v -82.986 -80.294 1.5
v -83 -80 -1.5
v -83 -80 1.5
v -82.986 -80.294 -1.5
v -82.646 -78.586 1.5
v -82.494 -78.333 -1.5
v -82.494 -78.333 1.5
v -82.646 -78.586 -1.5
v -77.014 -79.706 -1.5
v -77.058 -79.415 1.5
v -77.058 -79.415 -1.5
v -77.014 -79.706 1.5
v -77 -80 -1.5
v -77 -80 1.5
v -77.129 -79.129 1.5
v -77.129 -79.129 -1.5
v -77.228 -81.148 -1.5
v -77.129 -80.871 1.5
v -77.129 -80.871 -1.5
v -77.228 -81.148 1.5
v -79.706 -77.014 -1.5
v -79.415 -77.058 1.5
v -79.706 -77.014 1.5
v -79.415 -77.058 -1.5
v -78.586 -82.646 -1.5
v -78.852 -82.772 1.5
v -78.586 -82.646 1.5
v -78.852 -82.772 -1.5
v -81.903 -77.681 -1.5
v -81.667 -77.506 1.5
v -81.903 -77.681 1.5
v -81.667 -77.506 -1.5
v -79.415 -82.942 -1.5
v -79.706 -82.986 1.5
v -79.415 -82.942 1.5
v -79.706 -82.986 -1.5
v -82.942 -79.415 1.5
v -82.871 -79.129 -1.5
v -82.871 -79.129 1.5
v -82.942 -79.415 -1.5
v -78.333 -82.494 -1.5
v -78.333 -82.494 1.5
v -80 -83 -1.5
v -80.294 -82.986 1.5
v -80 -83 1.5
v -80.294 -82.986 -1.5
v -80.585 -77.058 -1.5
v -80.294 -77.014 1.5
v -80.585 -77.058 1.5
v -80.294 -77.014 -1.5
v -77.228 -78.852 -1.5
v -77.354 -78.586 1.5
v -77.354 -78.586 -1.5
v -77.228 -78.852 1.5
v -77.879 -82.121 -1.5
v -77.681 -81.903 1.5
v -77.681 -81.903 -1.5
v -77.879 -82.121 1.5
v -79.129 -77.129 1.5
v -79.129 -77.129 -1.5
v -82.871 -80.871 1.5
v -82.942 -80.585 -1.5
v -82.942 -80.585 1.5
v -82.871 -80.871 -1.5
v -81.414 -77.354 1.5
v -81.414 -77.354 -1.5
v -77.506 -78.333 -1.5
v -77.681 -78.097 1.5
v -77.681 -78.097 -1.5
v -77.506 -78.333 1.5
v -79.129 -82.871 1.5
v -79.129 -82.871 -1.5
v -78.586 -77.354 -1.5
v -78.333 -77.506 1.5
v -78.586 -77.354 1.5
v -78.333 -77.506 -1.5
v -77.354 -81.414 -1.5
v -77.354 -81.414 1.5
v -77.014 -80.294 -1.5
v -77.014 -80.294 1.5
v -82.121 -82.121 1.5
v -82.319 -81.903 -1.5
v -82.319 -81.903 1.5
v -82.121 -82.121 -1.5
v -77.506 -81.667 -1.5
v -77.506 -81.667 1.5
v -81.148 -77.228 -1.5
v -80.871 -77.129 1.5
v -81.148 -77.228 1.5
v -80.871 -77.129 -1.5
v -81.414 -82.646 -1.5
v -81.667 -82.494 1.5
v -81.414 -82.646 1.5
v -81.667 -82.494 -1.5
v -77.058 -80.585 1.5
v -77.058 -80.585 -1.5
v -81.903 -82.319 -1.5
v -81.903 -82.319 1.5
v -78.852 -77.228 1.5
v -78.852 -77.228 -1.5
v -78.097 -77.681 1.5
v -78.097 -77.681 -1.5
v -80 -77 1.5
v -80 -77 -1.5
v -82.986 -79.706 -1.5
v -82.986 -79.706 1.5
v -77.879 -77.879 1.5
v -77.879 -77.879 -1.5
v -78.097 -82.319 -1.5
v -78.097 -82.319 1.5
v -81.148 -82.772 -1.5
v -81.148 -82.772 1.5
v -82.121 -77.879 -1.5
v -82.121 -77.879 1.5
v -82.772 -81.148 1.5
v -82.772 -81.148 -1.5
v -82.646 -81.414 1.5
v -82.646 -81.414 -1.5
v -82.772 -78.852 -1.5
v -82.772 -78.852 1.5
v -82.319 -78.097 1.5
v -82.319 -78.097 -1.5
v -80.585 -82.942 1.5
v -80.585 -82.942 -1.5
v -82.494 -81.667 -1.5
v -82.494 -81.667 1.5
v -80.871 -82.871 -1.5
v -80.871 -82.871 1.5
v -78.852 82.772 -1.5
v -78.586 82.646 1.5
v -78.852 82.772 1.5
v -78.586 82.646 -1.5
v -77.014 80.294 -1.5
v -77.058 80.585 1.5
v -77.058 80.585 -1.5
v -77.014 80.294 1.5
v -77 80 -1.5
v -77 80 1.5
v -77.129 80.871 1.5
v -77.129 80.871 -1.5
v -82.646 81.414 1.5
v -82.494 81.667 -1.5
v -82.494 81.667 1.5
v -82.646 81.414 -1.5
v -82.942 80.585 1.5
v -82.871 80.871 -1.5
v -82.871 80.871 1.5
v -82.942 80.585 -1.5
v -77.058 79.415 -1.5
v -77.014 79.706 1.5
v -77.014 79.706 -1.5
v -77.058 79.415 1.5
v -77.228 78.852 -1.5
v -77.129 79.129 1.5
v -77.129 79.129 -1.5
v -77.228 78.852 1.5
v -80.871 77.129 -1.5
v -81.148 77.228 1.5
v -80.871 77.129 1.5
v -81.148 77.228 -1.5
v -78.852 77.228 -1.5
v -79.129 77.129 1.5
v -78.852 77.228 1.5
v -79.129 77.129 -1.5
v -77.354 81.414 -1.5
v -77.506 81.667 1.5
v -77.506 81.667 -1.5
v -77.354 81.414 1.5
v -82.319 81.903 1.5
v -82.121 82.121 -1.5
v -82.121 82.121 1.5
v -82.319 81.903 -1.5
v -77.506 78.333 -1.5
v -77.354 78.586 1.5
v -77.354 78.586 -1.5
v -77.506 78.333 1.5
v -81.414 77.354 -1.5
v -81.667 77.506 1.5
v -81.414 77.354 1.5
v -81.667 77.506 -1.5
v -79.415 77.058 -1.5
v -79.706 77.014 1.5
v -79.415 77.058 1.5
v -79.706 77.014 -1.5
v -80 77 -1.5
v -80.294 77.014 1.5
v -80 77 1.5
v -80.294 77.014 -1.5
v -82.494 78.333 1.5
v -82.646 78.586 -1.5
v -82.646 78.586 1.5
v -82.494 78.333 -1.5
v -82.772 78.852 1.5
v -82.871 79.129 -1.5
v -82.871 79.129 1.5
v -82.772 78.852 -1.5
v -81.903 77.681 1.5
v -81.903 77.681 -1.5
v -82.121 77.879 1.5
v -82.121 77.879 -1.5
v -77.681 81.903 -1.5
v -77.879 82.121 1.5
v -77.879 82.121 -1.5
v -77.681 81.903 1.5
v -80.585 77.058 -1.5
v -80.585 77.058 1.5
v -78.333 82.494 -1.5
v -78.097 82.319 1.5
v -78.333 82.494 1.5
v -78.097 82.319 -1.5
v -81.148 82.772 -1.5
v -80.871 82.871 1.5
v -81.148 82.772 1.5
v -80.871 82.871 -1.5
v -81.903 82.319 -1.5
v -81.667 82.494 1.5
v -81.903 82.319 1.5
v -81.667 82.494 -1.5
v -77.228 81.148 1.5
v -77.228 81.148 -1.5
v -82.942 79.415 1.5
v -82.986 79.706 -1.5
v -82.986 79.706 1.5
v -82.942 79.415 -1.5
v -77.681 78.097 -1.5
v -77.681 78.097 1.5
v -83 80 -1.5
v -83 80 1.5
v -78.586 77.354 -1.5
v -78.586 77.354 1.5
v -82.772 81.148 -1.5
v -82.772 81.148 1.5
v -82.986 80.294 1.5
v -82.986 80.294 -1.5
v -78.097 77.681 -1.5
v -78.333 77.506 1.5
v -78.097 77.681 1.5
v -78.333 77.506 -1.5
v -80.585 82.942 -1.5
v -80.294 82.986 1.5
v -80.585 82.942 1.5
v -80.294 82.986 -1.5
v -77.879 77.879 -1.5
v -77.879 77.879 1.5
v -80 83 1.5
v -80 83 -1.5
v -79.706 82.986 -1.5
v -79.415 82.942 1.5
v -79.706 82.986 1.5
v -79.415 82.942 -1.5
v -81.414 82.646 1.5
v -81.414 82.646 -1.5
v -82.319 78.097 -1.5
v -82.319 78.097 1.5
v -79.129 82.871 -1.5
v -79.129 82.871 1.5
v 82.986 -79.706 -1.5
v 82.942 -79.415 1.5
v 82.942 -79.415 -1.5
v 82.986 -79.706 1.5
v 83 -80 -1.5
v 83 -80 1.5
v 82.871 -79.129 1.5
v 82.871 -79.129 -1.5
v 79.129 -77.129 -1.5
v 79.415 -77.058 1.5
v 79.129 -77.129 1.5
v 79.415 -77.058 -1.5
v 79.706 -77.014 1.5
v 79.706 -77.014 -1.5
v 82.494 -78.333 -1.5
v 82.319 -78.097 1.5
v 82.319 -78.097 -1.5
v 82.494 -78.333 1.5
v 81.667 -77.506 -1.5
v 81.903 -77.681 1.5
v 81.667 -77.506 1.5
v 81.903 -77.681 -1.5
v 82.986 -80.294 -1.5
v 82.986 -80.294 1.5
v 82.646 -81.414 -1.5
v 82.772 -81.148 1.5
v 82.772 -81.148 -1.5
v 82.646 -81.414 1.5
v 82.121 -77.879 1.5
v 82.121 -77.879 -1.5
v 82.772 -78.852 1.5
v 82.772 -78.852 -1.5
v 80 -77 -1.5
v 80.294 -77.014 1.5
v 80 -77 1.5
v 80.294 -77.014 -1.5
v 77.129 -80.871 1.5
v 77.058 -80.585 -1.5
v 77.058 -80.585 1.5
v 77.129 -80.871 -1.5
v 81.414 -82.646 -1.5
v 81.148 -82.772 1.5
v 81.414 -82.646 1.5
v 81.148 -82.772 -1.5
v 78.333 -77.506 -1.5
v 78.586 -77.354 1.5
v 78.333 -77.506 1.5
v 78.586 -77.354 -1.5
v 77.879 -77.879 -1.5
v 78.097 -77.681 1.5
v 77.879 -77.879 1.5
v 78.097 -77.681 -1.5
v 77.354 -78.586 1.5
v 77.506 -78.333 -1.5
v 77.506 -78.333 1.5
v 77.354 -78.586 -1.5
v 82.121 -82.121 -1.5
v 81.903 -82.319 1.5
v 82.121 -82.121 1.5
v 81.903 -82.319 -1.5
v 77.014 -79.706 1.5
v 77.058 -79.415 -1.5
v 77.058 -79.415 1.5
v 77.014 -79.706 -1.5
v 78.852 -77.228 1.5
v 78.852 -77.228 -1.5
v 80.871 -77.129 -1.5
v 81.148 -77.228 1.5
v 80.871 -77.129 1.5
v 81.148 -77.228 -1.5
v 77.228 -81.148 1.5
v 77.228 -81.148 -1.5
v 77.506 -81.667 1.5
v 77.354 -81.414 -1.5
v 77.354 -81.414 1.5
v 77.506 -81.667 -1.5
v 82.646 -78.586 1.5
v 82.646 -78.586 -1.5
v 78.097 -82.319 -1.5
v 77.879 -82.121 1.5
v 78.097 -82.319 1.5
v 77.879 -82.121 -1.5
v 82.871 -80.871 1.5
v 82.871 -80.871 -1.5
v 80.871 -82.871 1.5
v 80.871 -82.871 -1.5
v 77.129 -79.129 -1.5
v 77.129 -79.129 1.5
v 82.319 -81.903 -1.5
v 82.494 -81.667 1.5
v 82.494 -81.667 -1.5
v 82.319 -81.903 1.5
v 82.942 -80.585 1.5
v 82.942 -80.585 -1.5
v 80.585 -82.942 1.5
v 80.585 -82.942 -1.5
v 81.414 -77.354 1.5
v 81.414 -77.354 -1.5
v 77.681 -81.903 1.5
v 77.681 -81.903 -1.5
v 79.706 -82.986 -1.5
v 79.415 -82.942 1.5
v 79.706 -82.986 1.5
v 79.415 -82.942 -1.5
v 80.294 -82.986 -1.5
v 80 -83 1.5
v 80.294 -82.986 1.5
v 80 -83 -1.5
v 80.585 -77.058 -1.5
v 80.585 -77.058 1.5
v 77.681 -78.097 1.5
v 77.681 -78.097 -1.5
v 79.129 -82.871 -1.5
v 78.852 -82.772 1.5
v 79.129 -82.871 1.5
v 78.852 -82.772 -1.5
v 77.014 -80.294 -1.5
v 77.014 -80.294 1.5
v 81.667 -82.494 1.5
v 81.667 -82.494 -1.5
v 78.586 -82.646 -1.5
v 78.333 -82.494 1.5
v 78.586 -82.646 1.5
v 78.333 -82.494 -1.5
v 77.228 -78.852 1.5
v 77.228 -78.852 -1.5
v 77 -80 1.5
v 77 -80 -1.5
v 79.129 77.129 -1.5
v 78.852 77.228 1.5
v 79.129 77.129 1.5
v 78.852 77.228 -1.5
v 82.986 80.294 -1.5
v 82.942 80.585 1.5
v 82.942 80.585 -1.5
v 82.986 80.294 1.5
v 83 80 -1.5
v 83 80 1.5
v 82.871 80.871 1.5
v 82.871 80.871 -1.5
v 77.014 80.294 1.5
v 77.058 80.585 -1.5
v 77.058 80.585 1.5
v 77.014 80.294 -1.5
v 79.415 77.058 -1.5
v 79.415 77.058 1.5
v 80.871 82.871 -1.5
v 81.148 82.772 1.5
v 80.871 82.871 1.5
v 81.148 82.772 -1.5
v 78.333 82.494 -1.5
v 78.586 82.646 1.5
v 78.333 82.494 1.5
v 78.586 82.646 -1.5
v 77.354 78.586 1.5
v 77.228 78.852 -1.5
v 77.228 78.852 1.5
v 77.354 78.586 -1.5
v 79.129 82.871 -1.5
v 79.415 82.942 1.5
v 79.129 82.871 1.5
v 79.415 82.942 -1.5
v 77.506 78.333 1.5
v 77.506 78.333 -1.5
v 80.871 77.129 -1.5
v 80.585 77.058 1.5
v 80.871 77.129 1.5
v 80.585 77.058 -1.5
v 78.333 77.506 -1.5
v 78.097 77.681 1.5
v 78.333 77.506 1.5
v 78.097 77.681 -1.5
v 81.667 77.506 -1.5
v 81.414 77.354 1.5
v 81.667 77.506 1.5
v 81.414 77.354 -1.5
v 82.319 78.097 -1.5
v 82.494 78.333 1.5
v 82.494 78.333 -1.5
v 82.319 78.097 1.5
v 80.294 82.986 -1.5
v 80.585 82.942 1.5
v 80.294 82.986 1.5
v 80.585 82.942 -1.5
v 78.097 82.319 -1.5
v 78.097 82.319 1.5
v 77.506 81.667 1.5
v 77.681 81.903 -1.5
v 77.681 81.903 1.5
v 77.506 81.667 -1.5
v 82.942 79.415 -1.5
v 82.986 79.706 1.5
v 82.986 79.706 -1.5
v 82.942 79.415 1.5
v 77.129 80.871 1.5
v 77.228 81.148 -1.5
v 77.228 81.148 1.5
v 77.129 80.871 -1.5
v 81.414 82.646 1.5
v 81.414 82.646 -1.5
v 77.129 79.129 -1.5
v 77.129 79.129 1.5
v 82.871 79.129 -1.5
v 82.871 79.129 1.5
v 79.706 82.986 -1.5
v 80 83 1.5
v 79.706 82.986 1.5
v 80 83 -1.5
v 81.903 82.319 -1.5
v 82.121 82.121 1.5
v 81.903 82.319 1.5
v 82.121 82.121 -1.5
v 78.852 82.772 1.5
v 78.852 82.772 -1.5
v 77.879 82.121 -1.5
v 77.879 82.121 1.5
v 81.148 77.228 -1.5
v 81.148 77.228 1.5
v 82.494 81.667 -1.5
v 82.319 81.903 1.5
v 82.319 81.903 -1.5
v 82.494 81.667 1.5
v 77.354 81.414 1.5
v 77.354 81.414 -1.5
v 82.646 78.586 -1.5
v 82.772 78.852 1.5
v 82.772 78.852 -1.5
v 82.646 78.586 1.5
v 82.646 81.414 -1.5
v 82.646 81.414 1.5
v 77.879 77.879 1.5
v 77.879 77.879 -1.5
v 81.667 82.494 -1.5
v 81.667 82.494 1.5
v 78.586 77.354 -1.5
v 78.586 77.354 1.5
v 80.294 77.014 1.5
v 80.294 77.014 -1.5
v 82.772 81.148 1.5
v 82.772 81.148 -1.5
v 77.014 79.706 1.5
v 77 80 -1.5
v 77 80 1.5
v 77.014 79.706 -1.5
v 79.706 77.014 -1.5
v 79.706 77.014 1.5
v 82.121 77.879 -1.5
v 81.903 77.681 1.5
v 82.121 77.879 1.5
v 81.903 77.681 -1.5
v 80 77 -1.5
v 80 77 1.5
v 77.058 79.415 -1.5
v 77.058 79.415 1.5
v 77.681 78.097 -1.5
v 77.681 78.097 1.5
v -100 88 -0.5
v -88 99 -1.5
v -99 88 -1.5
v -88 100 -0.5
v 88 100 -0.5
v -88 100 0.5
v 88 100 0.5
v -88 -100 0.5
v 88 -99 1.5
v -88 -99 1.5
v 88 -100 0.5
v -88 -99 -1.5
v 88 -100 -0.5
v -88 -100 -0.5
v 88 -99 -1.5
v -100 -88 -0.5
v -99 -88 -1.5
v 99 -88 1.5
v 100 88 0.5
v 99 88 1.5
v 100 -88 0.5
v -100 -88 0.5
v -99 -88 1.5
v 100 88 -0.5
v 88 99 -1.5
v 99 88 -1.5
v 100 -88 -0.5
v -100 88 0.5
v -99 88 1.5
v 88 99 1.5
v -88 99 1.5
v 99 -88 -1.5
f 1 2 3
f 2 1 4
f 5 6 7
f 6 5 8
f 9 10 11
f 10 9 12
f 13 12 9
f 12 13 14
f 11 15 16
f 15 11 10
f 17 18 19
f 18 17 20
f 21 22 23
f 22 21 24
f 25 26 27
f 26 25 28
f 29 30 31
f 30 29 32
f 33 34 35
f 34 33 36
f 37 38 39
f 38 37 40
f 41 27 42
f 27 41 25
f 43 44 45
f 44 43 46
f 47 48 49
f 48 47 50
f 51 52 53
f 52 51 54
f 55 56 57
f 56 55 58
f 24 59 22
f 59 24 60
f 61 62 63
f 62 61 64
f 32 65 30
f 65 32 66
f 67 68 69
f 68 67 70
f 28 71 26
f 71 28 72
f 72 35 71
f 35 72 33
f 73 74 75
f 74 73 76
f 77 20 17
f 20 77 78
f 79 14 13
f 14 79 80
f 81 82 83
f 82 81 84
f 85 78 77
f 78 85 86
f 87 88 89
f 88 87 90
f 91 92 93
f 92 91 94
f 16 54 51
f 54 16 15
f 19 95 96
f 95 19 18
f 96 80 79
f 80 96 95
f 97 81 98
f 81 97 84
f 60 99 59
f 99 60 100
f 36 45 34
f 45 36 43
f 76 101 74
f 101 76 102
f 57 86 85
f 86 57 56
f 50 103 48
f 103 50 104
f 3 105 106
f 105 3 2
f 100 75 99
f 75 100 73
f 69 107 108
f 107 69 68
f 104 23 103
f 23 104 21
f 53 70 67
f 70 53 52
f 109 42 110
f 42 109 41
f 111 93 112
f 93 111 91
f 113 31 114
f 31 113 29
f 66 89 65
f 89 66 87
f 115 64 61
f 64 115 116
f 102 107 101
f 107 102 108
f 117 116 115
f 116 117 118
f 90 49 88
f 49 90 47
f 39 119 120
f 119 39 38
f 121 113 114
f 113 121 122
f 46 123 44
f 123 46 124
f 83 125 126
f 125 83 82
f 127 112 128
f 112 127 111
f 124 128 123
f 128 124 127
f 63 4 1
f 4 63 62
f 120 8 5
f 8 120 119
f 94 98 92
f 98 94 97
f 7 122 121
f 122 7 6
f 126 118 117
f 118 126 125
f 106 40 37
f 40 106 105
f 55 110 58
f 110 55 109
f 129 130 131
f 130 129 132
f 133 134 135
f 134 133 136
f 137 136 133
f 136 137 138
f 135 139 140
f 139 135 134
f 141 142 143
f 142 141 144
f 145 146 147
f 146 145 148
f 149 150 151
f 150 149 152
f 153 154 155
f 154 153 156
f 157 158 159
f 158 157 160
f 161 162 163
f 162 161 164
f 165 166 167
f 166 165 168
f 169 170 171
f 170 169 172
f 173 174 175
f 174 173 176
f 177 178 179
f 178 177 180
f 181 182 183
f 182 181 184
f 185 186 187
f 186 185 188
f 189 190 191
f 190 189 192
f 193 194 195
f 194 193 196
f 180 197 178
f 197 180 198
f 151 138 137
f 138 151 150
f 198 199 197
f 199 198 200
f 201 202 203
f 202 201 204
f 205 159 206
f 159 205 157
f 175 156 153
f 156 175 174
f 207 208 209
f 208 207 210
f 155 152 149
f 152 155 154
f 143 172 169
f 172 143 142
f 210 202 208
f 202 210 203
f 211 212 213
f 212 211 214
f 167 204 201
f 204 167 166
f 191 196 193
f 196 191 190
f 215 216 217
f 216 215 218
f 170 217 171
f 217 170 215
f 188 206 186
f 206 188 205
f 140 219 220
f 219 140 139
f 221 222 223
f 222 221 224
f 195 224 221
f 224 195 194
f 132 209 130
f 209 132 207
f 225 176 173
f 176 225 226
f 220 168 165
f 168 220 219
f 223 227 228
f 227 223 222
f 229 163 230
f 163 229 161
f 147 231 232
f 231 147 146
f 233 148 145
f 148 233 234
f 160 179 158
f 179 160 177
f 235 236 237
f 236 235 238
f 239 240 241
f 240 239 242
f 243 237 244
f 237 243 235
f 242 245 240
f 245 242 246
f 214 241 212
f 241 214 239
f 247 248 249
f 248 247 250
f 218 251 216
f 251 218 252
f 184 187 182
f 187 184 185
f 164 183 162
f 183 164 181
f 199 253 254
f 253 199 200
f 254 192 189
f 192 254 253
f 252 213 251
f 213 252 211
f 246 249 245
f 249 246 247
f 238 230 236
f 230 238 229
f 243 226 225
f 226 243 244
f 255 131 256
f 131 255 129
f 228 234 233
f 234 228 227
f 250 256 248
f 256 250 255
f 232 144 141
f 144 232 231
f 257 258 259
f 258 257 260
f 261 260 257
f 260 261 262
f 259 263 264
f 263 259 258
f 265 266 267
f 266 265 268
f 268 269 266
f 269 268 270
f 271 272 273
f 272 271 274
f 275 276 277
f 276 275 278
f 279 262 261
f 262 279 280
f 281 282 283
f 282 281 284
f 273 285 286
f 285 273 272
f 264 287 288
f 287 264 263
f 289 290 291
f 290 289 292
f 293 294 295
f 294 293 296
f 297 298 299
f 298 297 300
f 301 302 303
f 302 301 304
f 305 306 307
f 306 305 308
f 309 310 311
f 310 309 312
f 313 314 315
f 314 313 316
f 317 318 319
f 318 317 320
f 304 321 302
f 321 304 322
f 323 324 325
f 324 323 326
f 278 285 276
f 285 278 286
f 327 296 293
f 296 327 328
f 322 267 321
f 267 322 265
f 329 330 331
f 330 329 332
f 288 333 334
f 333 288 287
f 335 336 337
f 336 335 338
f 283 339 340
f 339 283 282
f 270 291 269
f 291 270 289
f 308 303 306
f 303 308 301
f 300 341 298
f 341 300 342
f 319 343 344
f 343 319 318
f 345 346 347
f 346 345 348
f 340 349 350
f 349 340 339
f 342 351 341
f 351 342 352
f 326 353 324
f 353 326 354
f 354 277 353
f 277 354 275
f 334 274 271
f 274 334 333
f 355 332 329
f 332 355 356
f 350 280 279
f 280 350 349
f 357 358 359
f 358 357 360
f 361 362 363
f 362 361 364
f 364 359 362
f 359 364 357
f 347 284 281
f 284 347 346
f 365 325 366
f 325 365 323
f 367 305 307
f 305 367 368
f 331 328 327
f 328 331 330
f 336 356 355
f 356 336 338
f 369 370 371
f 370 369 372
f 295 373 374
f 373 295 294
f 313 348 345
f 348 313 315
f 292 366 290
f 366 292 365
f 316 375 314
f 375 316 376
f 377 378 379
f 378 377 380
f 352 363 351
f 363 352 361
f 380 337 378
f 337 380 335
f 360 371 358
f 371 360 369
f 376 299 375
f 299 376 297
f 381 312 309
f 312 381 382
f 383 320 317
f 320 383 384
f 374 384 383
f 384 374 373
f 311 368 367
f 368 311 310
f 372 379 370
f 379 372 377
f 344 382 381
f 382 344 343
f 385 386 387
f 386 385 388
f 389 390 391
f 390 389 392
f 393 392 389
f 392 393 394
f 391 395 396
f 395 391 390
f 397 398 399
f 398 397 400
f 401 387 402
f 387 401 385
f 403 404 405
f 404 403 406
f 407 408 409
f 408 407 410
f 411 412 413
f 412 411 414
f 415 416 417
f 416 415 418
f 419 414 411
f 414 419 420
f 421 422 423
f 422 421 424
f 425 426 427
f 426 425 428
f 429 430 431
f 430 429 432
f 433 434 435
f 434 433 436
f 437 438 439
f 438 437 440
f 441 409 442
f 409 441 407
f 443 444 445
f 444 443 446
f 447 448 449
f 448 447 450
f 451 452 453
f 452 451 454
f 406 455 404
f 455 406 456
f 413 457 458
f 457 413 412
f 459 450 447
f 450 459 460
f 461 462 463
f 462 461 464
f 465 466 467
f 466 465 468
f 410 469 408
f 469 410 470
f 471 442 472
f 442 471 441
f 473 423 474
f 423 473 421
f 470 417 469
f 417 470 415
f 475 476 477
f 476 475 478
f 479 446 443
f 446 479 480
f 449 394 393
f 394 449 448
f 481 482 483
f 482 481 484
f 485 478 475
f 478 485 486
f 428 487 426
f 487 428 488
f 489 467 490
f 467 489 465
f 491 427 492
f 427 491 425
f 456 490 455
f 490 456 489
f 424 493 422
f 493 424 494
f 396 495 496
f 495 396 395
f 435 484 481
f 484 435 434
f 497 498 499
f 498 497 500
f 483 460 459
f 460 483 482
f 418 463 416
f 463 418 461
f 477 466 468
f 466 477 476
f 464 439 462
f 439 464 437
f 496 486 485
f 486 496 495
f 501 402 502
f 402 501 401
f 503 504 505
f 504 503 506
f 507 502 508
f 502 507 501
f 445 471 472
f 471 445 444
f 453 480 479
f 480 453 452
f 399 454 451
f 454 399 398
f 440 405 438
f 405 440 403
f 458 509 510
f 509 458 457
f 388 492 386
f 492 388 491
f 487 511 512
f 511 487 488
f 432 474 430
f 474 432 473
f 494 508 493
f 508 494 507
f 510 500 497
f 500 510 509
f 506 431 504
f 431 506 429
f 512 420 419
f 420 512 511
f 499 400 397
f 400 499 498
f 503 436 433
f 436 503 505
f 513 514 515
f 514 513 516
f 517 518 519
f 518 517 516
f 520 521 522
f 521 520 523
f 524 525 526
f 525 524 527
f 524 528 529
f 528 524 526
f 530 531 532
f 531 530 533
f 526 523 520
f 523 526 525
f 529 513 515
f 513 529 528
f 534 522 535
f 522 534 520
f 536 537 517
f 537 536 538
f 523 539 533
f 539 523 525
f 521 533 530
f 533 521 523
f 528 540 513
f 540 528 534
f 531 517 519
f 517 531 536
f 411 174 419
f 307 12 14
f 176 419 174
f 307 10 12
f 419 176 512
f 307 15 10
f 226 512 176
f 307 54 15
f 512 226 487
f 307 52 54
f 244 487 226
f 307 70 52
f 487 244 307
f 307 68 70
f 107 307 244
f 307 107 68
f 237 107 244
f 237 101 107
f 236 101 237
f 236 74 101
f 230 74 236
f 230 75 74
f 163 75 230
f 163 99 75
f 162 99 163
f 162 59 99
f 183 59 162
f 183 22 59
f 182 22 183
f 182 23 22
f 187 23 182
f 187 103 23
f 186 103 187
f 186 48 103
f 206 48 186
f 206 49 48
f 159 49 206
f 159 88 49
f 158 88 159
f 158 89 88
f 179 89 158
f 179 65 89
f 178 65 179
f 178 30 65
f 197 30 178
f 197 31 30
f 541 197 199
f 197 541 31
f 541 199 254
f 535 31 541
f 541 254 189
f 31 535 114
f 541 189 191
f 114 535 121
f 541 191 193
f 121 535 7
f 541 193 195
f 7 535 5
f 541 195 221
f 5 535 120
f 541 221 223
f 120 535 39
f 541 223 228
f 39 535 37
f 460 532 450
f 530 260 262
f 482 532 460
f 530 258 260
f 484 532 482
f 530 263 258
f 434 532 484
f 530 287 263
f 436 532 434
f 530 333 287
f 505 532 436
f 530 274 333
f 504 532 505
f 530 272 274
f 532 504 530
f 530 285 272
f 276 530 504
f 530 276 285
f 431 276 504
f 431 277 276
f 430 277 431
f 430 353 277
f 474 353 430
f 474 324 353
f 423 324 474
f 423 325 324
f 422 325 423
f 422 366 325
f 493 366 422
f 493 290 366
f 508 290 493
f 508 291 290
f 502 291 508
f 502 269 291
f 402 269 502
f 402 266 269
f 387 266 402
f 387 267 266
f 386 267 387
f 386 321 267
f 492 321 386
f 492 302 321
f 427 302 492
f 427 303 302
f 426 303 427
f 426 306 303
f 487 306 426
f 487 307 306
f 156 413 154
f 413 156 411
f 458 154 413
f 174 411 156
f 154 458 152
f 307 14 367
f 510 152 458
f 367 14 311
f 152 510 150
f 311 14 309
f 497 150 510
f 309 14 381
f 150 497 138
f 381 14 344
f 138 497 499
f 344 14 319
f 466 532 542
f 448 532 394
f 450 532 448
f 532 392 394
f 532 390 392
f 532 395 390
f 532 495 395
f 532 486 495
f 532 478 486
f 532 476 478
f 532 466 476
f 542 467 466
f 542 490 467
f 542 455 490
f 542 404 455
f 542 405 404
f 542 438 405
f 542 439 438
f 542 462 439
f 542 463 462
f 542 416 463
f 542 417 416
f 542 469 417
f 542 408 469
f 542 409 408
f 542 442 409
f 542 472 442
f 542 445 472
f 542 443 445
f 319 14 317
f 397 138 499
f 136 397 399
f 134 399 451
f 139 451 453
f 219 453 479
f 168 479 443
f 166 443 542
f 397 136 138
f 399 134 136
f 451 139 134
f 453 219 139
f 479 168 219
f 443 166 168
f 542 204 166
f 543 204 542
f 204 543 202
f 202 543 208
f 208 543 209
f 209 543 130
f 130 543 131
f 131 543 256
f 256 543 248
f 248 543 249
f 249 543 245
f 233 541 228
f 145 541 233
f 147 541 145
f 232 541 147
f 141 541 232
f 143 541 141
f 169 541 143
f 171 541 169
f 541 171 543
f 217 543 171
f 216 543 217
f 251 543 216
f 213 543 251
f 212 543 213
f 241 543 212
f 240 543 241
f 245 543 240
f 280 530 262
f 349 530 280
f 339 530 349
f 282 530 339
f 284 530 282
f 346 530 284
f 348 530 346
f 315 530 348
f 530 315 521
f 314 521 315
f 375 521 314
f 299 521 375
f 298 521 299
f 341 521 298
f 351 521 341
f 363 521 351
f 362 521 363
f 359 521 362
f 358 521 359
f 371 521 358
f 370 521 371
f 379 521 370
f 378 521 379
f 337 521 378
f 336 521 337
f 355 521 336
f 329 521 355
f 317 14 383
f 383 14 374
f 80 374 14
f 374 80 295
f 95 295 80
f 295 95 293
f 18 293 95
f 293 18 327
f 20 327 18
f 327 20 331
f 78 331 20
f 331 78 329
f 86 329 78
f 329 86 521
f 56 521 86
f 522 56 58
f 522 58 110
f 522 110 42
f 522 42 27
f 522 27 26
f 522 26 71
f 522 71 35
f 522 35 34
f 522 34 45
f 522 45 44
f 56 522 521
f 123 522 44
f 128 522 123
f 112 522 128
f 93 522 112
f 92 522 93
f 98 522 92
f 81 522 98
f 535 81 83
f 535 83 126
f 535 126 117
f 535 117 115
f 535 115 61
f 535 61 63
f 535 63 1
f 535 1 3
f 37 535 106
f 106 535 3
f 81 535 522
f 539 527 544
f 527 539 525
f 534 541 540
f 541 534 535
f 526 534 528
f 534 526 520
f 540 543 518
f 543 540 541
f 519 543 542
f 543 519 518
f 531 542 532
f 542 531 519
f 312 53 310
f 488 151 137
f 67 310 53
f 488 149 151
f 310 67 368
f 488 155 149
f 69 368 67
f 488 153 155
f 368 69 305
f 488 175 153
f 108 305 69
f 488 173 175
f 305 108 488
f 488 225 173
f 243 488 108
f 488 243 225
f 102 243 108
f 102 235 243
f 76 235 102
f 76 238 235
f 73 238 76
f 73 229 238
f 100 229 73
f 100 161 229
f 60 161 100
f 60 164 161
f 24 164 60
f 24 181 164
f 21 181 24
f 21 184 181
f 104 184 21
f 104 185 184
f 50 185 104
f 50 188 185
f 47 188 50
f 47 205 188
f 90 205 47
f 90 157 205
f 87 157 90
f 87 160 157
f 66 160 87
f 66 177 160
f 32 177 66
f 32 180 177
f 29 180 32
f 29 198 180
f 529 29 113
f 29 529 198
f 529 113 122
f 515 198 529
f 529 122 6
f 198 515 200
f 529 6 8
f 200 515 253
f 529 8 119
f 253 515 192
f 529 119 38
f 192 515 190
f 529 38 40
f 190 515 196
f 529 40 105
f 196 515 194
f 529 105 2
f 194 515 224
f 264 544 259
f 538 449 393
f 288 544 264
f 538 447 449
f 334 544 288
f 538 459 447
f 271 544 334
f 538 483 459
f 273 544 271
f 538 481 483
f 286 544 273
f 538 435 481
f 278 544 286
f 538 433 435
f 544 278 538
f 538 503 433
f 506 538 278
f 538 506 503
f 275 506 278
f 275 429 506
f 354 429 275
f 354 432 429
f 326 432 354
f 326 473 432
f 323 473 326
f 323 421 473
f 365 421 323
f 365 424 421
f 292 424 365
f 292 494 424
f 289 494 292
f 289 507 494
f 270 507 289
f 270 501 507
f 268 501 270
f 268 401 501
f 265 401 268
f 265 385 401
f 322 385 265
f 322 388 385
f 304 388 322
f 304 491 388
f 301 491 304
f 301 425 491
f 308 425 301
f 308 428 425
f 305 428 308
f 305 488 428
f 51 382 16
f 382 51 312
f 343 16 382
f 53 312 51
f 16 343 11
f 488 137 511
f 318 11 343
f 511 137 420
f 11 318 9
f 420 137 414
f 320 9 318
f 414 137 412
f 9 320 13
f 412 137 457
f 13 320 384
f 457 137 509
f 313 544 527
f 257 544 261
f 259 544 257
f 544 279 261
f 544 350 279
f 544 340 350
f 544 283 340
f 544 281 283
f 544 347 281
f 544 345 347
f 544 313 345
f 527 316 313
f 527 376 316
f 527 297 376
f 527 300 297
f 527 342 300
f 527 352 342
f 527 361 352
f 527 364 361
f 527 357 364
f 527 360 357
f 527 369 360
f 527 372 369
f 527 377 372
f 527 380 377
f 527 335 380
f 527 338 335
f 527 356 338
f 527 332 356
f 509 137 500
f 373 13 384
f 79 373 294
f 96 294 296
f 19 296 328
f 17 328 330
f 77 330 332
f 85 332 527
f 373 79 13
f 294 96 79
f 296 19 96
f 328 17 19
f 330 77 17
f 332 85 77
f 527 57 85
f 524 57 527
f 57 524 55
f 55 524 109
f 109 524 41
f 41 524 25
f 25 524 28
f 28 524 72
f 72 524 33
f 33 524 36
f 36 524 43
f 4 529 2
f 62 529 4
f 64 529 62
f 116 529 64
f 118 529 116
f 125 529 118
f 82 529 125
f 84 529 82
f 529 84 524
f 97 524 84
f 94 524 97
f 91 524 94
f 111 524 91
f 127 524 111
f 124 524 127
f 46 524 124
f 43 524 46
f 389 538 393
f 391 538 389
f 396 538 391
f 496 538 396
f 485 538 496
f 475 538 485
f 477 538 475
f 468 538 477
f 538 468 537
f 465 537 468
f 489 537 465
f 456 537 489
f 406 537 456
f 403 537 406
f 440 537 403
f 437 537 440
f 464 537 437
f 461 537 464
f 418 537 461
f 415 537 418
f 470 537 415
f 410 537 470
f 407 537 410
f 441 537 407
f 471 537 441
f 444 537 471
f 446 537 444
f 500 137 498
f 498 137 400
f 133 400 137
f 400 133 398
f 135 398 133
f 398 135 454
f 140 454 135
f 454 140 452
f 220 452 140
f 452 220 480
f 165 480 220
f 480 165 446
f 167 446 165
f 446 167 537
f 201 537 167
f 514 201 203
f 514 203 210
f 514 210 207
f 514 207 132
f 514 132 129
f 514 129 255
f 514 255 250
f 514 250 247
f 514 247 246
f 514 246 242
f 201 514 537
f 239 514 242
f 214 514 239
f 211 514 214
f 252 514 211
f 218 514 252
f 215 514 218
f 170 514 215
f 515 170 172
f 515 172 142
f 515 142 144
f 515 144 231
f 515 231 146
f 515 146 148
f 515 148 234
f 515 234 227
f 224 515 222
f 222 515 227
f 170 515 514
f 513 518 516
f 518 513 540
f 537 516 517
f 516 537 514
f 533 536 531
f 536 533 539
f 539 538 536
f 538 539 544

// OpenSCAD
// Parameters
sheet_length = 200; //[100:400:1]
sheet_width = 200;  //[100:400:1]
sheet_thickness = 3; //[1.5:6:0.5]
corner_radius = 12; //[6:24:1]
hole_diameter = 6;  //[3:12:0.5]
hole_edge_offset = 20; //[10:40:1]
chamfer_size = 1;   //[0.5:3:0.25]

// Quality
$fn = 64;

// Helpers
function clamp(v, lo, hi) = v < lo ? lo : (v > hi ? hi : v);

// Keep parameters valid
cr = clamp(corner_radius, 0, min(sheet_length, sheet_width)/2);
cs = clamp(chamfer_size, 0, min(sheet_thickness/2, min(sheet_length, sheet_width)/4));
he = clamp(hole_edge_offset, hole_diameter/2 + 0.5, min(sheet_length, sheet_width)/2 - hole_diameter/2 - 0.5);

// 2D profile: rectangle with clipped (chamfered) corners
module sheet_profile_2d(L, W, c) {
    polygon(points=[
        [ L/2 - c,  W/2],
        [-L/2 + c,  W/2],
        [-L/2,      W/2 - c],
        [-L/2,     -W/2 + c],
        [-L/2 + c, -W/2],
        [ L/2 - c, -W/2],
        [ L/2,     -W/2 + c],
        [ L/2,      W/2 - c]
    ]);
}

// 3D sheet with clipped corners
module sheet_solid() {
    linear_extrude(height=sheet_thickness, center=true, convexity=10)
        sheet_profile_2d(sheet_length, sheet_width, cr);
}

// Through holes
module mounting_holes() {
    hole_h = sheet_thickness + 0.2; // slight overshoot to guarantee cut-through
    for (sx = [-1, 1], sy = [-1, 1])
        translate([sx*(sheet_length/2 - he), sy*(sheet_width/2 - he), 0])
            cylinder(h=hole_h, r=hole_diameter/2, center=true);
}

// Chamfer top and bottom edges using Minkowski with a small 3D "diamond"
module chamfered_sheet() {
    // Shrink XY by cs and Z by cs so Minkowski restores to target size
    L2 = sheet_length - 2*cs;
    W2 = sheet_width  - 2*cs;
    T2 = sheet_thickness - 2*cs;

    if (cs <= 0) {
        sheet_solid();
    } else if (L2 <= 0 || W2 <= 0 || T2 <= 0) {
        // Fallback: no chamfer if parameters would invert geometry
        sheet_solid();
    } else {
        minkowski() {
            linear_extrude(height=T2, center=true, convexity=10)
                sheet_profile_2d(L2, W2, max(0, cr - cs));
            // L1 ball (octahedron) gives a clean 45° chamfer
            polyhedron(
                points=[
                    [ cs, 0, 0], [-cs, 0, 0],
                    [ 0, cs, 0], [ 0,-cs, 0],
                    [ 0, 0, cs], [ 0, 0,-cs]
                ],
                faces=[
                    [0,2,4],[2,1,4],[1,3,4],[3,0,4],
                    [2,0,5],[1,2,5],[3,1,5],[0,3,5]
                ]
            );
        }
    }
}

// Final Model (one connected solid with holes)
difference() {
    chamfered_sheet();
    mounting_holes();
}
